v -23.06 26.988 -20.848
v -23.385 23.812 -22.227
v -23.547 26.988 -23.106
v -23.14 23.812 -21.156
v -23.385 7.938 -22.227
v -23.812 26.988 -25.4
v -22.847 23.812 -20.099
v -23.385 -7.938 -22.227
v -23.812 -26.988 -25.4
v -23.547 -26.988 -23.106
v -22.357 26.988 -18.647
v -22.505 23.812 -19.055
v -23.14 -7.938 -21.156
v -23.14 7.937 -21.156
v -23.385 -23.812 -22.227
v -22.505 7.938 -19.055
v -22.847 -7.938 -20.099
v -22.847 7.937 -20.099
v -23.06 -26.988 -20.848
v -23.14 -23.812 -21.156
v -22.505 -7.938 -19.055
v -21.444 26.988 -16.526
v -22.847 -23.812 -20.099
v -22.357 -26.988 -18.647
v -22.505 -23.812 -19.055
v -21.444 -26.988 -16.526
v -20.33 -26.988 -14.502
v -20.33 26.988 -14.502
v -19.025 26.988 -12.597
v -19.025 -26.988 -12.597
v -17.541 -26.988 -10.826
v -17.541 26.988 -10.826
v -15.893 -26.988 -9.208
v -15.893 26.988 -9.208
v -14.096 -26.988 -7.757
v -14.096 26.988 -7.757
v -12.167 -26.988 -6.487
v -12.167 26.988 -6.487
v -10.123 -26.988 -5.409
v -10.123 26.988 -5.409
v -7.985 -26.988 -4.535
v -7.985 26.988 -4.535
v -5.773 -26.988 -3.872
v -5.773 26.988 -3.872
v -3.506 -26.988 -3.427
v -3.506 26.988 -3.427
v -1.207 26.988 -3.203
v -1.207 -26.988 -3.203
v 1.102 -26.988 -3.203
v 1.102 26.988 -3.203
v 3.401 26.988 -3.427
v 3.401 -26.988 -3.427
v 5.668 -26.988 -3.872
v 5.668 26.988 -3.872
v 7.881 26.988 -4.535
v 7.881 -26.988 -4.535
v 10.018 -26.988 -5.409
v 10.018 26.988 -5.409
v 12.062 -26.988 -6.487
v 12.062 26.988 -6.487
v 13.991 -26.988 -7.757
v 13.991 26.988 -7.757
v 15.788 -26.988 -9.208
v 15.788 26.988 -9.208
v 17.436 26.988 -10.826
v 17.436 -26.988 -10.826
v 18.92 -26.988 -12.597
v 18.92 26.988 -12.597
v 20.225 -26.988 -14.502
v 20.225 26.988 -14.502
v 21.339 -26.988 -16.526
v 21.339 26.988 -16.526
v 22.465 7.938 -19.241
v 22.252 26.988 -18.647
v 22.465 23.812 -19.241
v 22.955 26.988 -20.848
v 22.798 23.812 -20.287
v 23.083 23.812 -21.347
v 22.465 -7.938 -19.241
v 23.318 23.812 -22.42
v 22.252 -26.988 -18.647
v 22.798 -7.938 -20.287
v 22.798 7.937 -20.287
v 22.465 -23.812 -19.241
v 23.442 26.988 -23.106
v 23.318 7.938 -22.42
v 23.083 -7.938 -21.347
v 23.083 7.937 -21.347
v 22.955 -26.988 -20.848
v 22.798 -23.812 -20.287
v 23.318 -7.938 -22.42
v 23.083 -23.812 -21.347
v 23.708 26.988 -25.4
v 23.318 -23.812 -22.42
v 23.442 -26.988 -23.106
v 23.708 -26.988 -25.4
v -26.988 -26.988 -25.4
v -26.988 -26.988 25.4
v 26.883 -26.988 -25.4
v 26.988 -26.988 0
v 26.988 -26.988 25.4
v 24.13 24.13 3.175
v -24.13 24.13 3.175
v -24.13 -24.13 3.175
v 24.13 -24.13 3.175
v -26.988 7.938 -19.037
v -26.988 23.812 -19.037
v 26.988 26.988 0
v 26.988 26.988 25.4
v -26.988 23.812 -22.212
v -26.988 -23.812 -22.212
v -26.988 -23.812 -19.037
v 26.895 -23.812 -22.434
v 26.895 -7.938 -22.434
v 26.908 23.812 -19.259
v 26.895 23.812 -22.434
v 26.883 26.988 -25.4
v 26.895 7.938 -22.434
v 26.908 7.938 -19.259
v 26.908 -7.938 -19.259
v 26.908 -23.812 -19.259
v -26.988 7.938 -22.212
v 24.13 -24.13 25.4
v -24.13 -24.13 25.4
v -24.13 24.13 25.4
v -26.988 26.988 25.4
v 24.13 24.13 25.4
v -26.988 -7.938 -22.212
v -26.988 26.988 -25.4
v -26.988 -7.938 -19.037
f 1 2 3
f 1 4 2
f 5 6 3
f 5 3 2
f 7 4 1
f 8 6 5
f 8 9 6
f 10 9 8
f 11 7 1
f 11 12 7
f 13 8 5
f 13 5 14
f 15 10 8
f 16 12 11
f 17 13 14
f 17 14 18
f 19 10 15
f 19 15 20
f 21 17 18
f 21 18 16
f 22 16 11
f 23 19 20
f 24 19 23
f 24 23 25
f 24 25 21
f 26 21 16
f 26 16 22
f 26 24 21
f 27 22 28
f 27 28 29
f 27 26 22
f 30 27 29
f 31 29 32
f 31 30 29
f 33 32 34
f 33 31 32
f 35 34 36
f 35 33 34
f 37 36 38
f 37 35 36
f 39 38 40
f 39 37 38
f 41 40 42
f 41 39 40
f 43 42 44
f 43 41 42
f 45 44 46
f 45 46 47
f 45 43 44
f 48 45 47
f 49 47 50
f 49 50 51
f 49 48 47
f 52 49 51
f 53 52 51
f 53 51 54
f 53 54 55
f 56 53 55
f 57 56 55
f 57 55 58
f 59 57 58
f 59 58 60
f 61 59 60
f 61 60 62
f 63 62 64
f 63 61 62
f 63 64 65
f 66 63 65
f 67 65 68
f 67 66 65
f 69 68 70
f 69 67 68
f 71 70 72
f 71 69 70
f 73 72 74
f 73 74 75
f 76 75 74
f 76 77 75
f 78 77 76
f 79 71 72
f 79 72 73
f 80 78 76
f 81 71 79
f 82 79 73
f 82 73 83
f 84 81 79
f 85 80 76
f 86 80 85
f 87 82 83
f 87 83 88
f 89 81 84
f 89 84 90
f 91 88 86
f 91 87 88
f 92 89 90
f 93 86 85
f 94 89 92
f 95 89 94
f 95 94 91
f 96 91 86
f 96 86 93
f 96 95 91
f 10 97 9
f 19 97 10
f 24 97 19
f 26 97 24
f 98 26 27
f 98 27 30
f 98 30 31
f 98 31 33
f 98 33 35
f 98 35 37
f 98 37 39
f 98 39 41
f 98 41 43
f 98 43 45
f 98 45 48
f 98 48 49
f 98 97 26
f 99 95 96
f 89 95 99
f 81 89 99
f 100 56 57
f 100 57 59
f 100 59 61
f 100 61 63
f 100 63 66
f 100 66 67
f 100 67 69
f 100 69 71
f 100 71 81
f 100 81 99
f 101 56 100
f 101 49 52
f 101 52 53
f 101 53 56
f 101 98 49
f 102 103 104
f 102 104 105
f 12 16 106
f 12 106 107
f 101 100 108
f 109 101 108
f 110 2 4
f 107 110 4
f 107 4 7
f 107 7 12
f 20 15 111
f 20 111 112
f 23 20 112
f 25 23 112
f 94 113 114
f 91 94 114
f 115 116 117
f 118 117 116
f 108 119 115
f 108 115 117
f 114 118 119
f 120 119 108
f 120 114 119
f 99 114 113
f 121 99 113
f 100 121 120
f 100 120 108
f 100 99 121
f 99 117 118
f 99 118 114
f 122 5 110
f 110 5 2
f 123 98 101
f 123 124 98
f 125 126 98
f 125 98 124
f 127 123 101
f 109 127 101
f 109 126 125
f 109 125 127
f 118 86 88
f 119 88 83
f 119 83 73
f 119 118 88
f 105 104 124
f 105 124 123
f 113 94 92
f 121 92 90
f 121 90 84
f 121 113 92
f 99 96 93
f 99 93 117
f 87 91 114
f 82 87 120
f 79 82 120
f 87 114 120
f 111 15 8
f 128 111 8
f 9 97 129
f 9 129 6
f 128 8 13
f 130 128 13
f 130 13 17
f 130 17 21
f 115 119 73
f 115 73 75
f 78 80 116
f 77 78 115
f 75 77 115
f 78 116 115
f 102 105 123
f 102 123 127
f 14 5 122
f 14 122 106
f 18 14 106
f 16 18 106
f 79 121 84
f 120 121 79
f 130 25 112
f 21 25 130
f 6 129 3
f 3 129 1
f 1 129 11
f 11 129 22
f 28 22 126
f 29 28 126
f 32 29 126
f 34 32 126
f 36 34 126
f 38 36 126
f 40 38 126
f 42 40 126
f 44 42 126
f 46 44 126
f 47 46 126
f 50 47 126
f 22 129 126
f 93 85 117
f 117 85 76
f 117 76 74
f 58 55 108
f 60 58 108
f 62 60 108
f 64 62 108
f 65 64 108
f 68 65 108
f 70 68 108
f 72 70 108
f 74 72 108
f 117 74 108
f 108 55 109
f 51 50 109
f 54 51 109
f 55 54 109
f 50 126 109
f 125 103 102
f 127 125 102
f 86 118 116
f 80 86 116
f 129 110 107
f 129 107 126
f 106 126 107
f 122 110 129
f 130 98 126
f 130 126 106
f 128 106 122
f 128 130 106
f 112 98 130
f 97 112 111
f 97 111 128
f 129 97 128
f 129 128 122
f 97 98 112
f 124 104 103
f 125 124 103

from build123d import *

# Parameters (mm, degrees)
F0_W     = 48.26
F0_H     = 48.26
F1_DEPTH = 3.175
F0_W_2   = 53.975
F0_H_2   = 53.975
F2_DEPTH = 25.4
F4_DEPTH = 53.975
F5_W     = 15.875
F5_H     = 3.175
F6_DEPTH = 63.5


with BuildPart() as f1:
    # F0 (on Top) → F1 (new body)
    with BuildSketch(Plane.XY):
        Rectangle(F0_W, F0_H)
    extrude(amount=F1_DEPTH)

    # F0 (on Top) → F2 (join)
    with BuildSketch(Plane.XY):
        Rectangle(F0_W_2, F0_H_2)
        Rectangle(F0_W, F0_H, mode=Mode.SUBTRACT)
    extrude(amount=F2_DEPTH)

    # F3 (on face) → F4 (join)
    with BuildSketch(Plane.XZ.offset(26.9875)):
        with BuildLine():
            Line((26.9875, 0), (-26.9875, 0))
            Line((-26.9875, 0), (-26.9875, -25.4))
            Line((-26.9875, -25.4), (-23.8125, -25.4))
            ThreePointArc((-23.8125, -25.4), (-0.052452, -3.175), (23.707596, -25.4))
            Line((23.707596, -25.4), (26.882596, -25.4))
            Line((26.882596, -25.4), (26.9875, 0))
        make_face()
    extrude(amount=-F4_DEPTH)

    # F5 (on face) → F6 (cut)
    with BuildSketch(Plane(origin=(26.98704, 0, -0.111459), x_dir=(0, 1, 0), z_dir=(0.999991, 0, -0.00413))):
        with Locations((-15.875, -20.73563)):
            Rectangle(F5_W, F5_H)
        with Locations((15.875, -20.73563)):
            Rectangle(F5_W, F5_H)
    extrude(amount=-F6_DEPTH, mode=Mode.SUBTRACT)


solid = f1.part
